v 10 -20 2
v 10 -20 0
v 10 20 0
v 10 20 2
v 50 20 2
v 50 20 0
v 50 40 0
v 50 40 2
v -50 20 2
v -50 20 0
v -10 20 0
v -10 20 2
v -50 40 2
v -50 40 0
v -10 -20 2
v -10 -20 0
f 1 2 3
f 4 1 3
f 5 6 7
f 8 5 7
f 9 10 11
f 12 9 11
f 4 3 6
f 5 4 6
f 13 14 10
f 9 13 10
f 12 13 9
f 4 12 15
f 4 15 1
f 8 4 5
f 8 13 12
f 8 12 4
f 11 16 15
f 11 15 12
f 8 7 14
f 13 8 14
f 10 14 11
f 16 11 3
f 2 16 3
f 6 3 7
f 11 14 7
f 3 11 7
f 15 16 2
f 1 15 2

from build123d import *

# Parameters (mm, degrees)
SKETCH1_W           = 20
SKETCH1_H           = 40
BOSS_EXTRUDE1_DEPTH = 2


with BuildPart() as part:
    # Sketch1 → Boss-Extrude1 (new body)
    with BuildSketch(Plane.XY):
        Polygon((-50, 20), (-10, 20), (10, 20), (50, 20), (50, 40), (-50, 40), align=None)
        Rectangle(SKETCH1_W, SKETCH1_H)
    extrude(amount=BOSS_EXTRUDE1_DEPTH)


solid = part.part
